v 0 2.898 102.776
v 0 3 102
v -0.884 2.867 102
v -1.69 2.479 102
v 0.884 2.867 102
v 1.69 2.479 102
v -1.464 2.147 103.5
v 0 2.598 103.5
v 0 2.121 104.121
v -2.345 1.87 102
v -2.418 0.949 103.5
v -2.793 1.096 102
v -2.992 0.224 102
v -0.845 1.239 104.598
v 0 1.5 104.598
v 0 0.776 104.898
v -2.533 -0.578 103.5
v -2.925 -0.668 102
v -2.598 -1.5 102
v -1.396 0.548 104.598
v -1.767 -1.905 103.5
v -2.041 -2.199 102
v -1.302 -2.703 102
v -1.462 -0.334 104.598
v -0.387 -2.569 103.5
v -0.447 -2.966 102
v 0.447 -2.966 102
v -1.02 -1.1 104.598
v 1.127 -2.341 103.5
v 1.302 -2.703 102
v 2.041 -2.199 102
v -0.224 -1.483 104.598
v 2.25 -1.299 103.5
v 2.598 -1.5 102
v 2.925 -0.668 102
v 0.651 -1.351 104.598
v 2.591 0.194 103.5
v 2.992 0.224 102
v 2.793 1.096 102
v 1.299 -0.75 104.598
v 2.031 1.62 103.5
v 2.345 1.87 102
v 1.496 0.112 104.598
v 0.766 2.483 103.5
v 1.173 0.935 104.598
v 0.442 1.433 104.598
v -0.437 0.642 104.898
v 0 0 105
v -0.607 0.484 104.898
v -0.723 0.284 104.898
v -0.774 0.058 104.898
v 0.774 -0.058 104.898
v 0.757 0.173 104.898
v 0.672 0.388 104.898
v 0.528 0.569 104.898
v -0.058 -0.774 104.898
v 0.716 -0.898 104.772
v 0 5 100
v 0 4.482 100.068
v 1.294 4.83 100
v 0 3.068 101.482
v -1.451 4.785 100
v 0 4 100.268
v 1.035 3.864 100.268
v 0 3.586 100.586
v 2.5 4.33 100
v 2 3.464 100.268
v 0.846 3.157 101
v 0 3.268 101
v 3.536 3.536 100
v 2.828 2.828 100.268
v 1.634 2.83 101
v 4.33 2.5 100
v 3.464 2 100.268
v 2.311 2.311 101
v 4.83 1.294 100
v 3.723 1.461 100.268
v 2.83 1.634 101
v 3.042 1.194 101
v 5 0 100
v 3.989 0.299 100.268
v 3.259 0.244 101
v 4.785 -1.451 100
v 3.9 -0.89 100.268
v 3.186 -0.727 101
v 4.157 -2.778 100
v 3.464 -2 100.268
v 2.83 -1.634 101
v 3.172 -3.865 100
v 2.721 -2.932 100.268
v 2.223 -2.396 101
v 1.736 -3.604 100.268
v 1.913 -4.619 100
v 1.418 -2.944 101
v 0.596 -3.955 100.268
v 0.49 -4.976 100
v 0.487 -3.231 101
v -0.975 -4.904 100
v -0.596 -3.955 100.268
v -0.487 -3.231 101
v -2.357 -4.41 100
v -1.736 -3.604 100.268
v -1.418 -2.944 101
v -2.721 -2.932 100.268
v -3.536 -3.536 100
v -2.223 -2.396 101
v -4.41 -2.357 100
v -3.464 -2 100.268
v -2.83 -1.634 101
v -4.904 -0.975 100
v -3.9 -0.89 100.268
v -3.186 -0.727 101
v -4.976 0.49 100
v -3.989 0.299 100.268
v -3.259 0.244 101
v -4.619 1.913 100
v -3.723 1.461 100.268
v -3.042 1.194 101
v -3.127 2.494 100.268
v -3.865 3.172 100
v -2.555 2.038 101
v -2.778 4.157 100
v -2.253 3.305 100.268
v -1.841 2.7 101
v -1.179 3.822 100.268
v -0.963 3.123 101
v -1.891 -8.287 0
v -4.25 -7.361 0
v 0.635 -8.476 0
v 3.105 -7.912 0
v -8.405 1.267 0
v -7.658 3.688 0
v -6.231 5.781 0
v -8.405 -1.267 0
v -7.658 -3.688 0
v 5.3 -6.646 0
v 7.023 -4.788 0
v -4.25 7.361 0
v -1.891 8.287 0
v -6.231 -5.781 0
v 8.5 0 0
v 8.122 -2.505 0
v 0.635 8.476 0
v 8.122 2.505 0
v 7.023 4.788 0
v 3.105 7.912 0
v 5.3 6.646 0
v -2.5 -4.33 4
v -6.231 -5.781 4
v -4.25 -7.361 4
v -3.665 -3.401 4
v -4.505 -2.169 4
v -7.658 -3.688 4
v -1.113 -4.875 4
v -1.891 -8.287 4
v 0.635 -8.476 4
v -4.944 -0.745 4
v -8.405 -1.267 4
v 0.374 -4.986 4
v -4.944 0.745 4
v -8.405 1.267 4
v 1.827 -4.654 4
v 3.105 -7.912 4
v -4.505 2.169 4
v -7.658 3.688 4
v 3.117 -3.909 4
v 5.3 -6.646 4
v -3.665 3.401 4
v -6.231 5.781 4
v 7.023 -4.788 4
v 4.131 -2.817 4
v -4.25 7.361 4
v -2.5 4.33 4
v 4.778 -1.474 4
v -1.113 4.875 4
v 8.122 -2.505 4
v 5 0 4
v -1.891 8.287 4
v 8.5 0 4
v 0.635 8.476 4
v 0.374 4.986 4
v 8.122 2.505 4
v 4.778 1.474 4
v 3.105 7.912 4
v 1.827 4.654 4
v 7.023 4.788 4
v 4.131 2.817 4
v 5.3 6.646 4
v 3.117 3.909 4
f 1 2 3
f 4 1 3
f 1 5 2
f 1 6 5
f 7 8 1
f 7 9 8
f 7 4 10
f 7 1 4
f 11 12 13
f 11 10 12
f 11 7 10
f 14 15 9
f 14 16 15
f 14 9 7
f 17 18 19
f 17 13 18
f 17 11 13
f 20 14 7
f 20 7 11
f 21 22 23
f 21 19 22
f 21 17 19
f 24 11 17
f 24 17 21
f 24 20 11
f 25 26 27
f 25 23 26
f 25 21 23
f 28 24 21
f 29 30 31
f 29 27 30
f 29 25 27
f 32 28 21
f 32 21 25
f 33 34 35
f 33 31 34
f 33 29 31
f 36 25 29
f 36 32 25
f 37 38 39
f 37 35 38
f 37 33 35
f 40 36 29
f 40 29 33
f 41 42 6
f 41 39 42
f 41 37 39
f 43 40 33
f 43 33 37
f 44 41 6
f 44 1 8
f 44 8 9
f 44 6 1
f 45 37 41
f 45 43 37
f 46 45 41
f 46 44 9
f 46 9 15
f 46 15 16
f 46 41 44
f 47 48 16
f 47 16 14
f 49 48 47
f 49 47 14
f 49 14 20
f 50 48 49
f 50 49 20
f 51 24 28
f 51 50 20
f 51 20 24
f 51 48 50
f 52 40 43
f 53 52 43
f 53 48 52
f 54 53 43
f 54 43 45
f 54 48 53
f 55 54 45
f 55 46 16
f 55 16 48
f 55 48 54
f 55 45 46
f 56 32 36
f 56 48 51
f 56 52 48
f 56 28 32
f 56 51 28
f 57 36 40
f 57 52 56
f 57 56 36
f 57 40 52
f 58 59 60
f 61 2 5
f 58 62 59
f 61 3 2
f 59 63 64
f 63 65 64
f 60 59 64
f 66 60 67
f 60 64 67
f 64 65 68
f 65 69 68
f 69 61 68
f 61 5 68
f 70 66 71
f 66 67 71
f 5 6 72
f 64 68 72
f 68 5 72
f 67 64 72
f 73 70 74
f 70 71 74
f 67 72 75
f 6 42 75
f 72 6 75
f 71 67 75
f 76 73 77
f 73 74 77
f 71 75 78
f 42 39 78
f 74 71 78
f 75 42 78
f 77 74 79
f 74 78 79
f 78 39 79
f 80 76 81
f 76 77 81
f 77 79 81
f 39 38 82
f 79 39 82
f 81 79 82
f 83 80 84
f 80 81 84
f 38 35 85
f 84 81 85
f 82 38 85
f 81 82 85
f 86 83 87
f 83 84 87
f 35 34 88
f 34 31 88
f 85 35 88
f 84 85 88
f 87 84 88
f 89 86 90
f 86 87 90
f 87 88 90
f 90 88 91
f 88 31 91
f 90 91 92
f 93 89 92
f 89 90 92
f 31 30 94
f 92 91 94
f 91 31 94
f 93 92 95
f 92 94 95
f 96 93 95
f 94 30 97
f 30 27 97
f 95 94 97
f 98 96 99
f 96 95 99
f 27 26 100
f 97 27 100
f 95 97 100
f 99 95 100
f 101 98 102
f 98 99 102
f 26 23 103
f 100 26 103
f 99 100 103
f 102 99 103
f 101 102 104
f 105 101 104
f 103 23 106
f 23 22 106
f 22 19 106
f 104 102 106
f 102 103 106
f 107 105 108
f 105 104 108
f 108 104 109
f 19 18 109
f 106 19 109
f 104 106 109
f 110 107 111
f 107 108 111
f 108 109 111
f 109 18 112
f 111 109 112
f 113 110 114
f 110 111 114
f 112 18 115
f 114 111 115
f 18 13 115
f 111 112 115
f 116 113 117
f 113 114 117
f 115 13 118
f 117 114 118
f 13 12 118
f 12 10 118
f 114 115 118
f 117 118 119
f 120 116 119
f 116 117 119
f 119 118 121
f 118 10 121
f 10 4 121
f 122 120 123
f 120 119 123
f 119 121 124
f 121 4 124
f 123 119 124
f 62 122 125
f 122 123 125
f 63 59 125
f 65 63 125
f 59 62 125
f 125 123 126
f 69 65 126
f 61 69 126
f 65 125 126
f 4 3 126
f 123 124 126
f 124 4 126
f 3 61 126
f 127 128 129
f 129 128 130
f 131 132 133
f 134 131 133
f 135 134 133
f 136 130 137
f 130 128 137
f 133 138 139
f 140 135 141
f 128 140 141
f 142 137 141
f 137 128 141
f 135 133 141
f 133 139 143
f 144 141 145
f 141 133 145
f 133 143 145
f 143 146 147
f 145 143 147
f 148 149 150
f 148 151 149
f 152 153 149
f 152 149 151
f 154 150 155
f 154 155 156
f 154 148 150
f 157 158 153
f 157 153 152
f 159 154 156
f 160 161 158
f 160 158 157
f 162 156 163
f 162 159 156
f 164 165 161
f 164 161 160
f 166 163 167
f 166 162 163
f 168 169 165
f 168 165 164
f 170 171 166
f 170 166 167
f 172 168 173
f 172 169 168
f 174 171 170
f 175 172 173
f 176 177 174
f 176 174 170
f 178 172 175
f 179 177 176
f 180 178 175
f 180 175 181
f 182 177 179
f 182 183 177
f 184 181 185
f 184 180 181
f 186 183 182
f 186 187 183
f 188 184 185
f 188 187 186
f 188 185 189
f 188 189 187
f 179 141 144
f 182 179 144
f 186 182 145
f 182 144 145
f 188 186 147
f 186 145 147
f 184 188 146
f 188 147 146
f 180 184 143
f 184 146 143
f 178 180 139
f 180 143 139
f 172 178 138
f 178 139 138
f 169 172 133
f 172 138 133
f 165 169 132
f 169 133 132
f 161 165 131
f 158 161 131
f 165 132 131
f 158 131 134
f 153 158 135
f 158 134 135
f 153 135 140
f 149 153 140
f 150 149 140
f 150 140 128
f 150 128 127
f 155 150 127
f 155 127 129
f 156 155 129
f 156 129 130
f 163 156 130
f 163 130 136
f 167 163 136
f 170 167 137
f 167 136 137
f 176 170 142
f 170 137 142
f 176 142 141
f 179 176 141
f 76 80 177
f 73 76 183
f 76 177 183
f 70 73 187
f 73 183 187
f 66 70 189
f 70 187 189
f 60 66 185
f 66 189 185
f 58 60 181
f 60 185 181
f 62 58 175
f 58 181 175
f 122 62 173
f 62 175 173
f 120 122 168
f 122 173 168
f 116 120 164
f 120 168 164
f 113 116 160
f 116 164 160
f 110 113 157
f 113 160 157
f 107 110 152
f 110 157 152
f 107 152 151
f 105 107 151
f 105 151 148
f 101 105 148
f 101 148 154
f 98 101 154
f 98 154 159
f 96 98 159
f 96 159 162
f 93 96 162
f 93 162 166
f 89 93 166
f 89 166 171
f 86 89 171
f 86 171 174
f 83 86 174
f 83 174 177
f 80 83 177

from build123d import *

# Parameters (mm, degrees)
F0_R     = 8.5
F1_DEPTH = 4
F2_R     = 5
F3_DEPTH = 100


with BuildPart() as f1:
    # F0 (on Top) → F1 (new body)
    with BuildSketch(Plane.XY):
        Circle(F0_R)
    extrude(amount=F1_DEPTH)

    # F2 (on Top) → F3 (join)
    with BuildSketch(Plane.XY):
        Circle(F2_R)
    extrude(amount=F3_DEPTH)

    # F4 (on Right) → F5 (revolve)
    with BuildSketch(Plane.YZ):
        with BuildLine():
            Line((3, 102), (0, 102))
            Line((0, 102), (0, 100))
            Line((0, 100), (5, 100))
            ThreePointArc((5, 100), (3.585786, 100.585786), (3, 102))
        make_face()
    revolve(axis=Axis((0, 0, 101), (0, 0, -1)))

    # F6 (on Right) → F7 (revolve)
    with BuildSketch(Plane.YZ):
        with BuildLine():
            Line((0, 105), (0, 102))
            Line((0, 102), (3, 102))
            ThreePointArc((3, 102), (2.12132, 104.12132), (0, 105))
        make_face()
    revolve(axis=Axis((0, 0, 103.5), (0, 0, 1)))


solid = f1.part
